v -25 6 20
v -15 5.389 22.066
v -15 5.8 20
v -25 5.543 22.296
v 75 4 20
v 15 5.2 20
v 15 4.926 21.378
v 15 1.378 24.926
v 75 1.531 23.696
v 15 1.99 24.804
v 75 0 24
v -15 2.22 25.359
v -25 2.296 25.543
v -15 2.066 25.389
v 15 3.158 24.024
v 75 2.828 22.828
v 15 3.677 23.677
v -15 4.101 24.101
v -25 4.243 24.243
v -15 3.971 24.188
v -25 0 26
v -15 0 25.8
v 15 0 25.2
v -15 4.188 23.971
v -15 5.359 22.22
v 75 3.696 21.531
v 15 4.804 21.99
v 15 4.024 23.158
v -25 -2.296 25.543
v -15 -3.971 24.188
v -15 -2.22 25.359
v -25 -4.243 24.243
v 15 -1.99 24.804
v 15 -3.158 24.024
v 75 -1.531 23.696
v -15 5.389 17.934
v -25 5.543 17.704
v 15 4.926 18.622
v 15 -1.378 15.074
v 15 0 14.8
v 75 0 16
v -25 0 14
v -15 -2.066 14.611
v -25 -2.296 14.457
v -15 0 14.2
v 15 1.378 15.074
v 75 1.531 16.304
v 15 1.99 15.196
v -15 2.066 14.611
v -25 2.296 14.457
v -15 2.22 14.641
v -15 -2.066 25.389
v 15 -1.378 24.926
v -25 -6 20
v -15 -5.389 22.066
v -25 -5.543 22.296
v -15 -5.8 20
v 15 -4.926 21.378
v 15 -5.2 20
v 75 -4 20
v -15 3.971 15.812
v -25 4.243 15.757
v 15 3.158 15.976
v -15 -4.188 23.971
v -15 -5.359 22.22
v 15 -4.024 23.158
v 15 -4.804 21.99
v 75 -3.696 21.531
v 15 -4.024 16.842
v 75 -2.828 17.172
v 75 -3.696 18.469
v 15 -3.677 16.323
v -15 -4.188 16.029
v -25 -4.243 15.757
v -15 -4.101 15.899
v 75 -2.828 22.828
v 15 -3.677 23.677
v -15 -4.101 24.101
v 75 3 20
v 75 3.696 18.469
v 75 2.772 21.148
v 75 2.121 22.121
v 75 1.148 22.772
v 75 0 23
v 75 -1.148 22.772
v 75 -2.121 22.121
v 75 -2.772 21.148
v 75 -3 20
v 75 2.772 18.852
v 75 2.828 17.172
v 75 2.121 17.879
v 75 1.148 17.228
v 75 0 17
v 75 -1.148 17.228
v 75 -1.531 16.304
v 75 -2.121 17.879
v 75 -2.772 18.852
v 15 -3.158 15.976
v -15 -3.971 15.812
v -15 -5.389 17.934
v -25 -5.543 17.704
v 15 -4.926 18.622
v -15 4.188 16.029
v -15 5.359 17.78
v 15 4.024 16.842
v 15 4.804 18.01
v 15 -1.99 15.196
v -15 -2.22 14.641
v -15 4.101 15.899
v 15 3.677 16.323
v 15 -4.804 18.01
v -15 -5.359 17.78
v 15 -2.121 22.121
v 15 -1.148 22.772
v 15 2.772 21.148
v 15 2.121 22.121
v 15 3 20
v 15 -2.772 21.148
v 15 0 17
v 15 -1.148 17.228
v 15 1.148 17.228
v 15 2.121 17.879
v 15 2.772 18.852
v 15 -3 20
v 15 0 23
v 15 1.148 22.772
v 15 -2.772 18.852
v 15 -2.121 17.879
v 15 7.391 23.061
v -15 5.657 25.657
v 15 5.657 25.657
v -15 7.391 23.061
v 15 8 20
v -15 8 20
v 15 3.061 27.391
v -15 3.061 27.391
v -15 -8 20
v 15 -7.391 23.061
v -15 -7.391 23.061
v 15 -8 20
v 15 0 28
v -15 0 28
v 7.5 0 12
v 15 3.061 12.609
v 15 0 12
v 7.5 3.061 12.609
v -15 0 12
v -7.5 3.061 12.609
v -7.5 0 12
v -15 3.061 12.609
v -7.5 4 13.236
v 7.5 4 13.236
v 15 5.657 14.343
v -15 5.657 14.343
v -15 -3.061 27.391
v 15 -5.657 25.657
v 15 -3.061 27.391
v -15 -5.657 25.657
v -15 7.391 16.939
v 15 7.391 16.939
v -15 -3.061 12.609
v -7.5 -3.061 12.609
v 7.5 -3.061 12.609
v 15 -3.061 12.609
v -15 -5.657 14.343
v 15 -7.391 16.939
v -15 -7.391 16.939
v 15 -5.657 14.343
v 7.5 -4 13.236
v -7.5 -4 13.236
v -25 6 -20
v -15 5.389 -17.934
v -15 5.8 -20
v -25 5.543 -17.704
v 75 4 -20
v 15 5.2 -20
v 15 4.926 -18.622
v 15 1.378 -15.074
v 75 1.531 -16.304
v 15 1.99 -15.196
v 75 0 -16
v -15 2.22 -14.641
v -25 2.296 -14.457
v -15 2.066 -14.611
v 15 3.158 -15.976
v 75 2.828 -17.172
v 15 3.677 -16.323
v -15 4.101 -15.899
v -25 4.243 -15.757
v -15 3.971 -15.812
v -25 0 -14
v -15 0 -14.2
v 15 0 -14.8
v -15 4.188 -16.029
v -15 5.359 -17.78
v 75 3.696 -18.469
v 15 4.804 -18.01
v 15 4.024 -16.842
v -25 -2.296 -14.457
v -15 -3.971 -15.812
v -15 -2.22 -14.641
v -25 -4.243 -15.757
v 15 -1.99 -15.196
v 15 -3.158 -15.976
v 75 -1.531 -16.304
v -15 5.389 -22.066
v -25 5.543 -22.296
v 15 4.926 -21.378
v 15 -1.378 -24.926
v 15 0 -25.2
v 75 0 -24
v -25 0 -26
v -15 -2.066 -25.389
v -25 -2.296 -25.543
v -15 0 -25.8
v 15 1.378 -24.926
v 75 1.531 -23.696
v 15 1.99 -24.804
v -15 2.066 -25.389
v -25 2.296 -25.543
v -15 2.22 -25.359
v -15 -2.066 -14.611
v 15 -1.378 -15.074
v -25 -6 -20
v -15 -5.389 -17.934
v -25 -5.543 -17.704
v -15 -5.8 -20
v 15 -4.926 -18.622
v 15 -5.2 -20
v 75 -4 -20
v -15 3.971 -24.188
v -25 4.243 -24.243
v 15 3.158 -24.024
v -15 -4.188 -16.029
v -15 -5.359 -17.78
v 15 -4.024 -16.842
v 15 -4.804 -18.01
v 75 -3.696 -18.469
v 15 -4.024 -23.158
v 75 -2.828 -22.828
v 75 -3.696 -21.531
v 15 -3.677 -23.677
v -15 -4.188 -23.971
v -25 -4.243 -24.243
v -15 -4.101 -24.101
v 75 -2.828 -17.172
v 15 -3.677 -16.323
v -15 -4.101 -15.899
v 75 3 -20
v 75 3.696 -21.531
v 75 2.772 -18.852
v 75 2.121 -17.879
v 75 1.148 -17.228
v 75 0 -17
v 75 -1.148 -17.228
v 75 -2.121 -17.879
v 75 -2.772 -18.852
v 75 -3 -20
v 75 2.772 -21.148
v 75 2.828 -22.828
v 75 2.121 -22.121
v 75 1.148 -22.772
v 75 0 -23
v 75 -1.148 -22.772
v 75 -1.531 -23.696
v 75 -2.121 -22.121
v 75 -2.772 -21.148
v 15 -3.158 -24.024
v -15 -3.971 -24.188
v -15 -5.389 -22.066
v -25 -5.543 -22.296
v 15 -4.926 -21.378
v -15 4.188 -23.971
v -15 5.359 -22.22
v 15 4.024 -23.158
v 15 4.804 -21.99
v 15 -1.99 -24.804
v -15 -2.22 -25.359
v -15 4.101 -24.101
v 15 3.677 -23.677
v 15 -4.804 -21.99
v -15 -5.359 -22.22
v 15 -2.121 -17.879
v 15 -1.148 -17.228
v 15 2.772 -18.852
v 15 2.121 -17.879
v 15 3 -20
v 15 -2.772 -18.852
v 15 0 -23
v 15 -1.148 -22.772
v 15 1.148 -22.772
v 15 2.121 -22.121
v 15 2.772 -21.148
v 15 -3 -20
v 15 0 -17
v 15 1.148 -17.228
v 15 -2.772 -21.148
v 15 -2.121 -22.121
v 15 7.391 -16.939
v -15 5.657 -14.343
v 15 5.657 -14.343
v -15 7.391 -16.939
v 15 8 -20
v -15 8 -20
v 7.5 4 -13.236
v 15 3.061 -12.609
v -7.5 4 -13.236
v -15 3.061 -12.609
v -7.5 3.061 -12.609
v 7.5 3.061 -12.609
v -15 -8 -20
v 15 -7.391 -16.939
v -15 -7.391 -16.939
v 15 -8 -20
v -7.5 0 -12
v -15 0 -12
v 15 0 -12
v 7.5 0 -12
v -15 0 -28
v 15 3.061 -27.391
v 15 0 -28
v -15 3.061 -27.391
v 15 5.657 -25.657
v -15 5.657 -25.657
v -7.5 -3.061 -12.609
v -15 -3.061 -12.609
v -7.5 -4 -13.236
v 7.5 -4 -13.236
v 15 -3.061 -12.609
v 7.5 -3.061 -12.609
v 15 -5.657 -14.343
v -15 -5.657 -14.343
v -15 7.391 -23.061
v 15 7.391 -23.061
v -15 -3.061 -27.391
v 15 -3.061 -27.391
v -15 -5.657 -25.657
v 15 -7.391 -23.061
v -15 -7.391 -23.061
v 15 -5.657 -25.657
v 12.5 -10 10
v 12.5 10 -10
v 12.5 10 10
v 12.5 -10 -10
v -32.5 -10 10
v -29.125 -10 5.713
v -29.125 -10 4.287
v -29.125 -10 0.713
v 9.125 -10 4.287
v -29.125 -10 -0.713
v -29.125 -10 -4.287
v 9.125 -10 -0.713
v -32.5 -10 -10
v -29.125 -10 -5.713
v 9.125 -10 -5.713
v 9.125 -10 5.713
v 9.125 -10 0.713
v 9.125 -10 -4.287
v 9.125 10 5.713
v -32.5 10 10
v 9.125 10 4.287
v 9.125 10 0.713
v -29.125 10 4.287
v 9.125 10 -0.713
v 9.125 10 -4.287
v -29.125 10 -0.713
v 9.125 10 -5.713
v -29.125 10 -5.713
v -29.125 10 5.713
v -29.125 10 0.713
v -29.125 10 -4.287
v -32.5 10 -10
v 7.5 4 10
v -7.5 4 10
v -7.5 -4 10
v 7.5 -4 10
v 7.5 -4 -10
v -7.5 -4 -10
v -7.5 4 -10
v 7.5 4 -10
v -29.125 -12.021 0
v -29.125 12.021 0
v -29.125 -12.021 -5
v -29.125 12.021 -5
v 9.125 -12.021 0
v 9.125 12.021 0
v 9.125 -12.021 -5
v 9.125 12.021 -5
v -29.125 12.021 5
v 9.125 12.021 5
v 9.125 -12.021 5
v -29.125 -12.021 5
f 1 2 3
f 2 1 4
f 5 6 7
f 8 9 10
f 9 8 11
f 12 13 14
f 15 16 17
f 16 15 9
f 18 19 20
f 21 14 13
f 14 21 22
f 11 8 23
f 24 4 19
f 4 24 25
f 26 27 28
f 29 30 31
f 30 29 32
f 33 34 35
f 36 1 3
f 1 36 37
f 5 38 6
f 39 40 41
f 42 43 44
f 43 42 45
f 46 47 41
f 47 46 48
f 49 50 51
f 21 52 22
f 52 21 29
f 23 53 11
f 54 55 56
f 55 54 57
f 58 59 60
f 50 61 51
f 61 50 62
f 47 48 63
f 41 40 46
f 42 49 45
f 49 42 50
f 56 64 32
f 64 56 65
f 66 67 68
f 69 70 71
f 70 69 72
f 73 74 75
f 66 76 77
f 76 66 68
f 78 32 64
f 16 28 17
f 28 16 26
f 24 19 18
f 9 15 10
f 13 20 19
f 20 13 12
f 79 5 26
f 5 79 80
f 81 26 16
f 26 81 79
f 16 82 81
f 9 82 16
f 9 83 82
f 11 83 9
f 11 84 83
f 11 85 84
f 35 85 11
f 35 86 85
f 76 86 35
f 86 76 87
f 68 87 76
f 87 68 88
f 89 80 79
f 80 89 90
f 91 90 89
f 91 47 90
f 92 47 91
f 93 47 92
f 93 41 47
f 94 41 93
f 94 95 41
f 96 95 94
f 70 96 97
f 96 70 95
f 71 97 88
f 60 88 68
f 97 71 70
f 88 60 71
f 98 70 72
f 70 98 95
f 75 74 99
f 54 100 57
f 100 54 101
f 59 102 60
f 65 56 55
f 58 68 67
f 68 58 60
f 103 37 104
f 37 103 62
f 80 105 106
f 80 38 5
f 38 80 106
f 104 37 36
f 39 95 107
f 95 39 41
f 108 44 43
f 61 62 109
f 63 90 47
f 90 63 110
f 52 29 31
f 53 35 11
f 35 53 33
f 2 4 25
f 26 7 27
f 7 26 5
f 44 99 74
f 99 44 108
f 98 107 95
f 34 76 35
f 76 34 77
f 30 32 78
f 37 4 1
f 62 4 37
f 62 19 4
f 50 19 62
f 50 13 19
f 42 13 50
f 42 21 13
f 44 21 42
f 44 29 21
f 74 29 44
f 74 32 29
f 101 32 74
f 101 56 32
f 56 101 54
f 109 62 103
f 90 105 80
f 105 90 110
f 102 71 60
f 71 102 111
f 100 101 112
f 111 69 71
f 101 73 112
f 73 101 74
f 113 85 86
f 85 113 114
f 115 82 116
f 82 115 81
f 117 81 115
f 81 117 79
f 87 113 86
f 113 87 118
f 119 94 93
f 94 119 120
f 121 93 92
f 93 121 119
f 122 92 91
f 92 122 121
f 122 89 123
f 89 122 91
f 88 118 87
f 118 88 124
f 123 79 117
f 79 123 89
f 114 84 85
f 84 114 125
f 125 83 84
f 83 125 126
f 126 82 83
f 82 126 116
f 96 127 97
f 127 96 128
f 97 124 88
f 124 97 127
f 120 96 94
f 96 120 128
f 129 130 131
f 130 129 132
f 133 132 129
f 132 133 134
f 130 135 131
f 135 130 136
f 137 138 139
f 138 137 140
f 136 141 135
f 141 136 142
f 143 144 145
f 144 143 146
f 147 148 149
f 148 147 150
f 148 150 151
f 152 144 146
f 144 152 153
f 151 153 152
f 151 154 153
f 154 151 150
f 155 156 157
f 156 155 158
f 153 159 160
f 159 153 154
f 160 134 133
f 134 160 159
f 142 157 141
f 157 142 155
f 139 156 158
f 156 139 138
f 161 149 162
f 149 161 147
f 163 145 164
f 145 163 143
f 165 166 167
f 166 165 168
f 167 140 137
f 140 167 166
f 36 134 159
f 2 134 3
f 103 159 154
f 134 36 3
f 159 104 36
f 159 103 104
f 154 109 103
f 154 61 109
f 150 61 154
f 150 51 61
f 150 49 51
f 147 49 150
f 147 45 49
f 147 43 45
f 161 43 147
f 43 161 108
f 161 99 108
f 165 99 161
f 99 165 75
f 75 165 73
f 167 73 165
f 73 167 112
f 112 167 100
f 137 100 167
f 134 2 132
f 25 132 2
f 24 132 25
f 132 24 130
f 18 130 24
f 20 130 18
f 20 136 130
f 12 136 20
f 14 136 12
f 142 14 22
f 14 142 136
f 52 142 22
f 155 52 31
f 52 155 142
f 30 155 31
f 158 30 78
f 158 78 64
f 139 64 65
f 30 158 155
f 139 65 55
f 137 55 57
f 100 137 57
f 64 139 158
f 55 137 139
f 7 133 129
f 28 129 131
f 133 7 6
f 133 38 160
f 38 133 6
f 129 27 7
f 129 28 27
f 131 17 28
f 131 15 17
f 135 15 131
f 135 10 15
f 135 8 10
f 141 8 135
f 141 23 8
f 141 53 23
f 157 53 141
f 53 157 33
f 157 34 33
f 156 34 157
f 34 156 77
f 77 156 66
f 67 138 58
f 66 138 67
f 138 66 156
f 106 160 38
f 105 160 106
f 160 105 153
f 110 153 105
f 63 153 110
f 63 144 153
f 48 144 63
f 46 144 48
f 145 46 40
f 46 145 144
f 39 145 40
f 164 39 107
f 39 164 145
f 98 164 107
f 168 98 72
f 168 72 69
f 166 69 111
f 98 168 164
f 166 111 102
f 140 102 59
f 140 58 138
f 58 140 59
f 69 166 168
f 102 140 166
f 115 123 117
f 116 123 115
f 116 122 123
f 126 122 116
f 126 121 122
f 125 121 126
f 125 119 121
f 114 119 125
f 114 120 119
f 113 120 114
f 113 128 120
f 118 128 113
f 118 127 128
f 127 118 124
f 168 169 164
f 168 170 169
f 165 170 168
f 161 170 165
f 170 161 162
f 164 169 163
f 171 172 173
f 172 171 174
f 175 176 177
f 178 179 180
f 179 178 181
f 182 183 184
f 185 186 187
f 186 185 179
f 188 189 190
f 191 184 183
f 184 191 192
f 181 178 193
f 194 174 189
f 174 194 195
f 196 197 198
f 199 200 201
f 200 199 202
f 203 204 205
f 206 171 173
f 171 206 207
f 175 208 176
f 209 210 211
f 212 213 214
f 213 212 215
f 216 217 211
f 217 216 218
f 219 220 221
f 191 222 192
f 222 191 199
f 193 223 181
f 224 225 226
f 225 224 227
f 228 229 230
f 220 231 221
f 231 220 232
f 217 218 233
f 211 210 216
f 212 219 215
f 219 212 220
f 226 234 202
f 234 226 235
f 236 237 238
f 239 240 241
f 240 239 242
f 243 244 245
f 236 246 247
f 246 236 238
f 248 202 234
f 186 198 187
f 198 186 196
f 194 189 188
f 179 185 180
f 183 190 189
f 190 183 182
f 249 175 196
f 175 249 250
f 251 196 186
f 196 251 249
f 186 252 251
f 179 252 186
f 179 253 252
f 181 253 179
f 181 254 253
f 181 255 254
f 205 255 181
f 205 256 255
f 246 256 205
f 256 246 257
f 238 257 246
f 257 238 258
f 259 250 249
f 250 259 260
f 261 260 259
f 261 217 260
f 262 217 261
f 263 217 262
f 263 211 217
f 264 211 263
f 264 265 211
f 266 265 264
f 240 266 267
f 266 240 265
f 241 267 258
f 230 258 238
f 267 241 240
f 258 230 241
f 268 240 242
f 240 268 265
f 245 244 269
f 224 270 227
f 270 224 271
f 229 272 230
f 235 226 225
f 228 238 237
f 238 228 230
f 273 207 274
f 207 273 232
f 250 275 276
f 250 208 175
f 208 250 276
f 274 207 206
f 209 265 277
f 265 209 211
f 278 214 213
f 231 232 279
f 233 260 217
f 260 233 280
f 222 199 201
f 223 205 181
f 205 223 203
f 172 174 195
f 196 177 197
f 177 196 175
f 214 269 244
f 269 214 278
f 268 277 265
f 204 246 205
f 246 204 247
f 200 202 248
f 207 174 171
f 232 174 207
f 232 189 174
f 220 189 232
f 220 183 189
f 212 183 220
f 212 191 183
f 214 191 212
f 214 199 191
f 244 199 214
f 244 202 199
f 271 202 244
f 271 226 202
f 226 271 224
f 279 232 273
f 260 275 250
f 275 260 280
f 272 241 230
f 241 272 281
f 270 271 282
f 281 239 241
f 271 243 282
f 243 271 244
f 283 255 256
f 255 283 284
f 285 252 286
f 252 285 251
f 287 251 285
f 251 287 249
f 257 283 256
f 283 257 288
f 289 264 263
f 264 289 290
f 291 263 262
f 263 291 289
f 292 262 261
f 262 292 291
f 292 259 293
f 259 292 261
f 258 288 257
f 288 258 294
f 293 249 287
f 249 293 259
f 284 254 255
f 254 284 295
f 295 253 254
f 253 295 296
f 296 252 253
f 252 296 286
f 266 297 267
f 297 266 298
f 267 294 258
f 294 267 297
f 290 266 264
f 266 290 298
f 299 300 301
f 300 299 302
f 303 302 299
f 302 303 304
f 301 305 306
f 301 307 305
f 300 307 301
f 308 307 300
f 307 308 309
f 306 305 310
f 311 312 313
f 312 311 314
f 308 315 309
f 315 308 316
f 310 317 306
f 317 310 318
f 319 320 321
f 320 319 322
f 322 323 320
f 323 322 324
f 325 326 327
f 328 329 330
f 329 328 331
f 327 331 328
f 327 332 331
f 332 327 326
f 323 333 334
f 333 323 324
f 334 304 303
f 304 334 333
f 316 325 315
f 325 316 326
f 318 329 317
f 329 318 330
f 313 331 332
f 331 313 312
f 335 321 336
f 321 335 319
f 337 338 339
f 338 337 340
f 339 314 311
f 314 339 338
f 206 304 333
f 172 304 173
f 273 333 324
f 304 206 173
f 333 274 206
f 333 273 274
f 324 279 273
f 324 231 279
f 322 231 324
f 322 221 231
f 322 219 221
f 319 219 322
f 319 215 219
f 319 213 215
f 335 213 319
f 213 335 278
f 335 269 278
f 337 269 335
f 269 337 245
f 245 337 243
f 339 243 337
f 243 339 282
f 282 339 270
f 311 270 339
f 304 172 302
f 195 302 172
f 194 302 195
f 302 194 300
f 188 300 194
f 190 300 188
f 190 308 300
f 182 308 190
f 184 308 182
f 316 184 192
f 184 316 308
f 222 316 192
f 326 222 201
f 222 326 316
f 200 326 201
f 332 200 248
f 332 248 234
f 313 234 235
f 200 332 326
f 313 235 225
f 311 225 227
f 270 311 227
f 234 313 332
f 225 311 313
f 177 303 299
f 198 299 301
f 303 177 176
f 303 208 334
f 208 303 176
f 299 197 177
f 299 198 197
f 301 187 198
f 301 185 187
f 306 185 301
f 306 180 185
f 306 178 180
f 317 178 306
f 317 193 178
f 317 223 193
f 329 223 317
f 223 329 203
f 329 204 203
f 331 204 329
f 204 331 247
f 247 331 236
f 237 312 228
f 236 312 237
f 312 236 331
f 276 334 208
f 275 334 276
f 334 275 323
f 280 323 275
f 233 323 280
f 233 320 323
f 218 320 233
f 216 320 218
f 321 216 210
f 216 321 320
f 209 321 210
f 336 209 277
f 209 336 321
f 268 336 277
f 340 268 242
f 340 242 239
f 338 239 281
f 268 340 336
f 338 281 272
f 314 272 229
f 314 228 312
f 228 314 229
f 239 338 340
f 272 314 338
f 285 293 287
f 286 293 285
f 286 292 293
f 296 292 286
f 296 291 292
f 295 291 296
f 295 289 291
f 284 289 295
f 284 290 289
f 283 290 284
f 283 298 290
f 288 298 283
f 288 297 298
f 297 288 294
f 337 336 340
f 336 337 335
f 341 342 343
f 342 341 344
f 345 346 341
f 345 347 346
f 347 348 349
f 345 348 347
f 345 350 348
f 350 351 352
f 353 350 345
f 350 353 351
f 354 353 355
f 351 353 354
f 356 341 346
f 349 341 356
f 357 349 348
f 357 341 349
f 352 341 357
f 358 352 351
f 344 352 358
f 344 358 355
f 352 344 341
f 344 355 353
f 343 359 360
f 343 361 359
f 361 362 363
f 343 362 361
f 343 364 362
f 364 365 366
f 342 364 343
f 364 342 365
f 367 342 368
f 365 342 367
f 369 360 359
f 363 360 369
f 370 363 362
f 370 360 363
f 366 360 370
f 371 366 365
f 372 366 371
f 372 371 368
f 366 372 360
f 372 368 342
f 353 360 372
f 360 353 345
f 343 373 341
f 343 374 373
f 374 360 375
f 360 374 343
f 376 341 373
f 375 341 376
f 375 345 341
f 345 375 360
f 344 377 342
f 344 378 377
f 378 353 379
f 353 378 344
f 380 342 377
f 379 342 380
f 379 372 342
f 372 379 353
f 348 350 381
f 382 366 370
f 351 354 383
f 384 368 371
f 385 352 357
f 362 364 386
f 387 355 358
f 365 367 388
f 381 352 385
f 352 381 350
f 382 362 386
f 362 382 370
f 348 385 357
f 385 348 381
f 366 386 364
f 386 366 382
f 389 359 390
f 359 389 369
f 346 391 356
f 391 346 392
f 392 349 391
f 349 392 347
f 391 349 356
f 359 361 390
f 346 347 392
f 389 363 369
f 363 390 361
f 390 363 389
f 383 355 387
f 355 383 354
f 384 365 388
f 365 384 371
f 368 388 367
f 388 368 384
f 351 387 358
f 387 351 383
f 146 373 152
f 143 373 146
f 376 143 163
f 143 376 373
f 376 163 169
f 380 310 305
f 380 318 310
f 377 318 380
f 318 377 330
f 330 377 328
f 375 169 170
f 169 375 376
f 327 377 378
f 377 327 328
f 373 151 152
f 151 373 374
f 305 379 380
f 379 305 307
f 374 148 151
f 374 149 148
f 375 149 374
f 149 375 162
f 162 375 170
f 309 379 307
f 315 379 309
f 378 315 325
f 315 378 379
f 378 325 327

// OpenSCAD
$fn = 16;

module barrel()
{
	union() {
		rotate(v = [0, 1, 0], a = 90) {
			translate(v = [0, 0, 25]) {
				difference() {
					cylinder(h = 100, r1 = 6, r2 = 4, center = true);
					translate(v = [0, 0, 25])
						cylinder(h = 100, r1 = 3, r2 = 3, center = true);
				}
				translate(v = [0, 0, -25])
					cylinder(h = 30, r1 = 8, r2 = 8, center = true);
			}
		}
	}
}

module barrel_pair()
{
	translate(v = [0, 20, 0])
		barrel();
	translate(v = [0, -20, 0])
		barrel();
}

module turret()
{
	union() {
		barrel_pair();
		translate(v = [-10, 0, 0]) {
		cube(size = [45, 20, 20], center = true);
			scale(v = [0.85, 0.3, 0.85])
				rotate(v = [1, 0, 0], a = 45)
					cube(size = [45, 20, 20], center = true);
			translate(v = [0, 5, 0])
				scale(v = [0.85, 0.3, 0.85])
					rotate(v = [1, 0, 0], a = 45)
						cube(size = [45, 20, 20], center = true);
			translate(v = [0, -5, 0])
				scale(v = [0.85, 0.3, 0.85])
					rotate(v = [1, 0, 0], a = 45)
						cube(size = [45, 20, 20], center = true);
		}
		cube(size = [15, 40, 8], center = true);
	}
}

rotate(v = [1, 0, 0], 90)
	turret();
